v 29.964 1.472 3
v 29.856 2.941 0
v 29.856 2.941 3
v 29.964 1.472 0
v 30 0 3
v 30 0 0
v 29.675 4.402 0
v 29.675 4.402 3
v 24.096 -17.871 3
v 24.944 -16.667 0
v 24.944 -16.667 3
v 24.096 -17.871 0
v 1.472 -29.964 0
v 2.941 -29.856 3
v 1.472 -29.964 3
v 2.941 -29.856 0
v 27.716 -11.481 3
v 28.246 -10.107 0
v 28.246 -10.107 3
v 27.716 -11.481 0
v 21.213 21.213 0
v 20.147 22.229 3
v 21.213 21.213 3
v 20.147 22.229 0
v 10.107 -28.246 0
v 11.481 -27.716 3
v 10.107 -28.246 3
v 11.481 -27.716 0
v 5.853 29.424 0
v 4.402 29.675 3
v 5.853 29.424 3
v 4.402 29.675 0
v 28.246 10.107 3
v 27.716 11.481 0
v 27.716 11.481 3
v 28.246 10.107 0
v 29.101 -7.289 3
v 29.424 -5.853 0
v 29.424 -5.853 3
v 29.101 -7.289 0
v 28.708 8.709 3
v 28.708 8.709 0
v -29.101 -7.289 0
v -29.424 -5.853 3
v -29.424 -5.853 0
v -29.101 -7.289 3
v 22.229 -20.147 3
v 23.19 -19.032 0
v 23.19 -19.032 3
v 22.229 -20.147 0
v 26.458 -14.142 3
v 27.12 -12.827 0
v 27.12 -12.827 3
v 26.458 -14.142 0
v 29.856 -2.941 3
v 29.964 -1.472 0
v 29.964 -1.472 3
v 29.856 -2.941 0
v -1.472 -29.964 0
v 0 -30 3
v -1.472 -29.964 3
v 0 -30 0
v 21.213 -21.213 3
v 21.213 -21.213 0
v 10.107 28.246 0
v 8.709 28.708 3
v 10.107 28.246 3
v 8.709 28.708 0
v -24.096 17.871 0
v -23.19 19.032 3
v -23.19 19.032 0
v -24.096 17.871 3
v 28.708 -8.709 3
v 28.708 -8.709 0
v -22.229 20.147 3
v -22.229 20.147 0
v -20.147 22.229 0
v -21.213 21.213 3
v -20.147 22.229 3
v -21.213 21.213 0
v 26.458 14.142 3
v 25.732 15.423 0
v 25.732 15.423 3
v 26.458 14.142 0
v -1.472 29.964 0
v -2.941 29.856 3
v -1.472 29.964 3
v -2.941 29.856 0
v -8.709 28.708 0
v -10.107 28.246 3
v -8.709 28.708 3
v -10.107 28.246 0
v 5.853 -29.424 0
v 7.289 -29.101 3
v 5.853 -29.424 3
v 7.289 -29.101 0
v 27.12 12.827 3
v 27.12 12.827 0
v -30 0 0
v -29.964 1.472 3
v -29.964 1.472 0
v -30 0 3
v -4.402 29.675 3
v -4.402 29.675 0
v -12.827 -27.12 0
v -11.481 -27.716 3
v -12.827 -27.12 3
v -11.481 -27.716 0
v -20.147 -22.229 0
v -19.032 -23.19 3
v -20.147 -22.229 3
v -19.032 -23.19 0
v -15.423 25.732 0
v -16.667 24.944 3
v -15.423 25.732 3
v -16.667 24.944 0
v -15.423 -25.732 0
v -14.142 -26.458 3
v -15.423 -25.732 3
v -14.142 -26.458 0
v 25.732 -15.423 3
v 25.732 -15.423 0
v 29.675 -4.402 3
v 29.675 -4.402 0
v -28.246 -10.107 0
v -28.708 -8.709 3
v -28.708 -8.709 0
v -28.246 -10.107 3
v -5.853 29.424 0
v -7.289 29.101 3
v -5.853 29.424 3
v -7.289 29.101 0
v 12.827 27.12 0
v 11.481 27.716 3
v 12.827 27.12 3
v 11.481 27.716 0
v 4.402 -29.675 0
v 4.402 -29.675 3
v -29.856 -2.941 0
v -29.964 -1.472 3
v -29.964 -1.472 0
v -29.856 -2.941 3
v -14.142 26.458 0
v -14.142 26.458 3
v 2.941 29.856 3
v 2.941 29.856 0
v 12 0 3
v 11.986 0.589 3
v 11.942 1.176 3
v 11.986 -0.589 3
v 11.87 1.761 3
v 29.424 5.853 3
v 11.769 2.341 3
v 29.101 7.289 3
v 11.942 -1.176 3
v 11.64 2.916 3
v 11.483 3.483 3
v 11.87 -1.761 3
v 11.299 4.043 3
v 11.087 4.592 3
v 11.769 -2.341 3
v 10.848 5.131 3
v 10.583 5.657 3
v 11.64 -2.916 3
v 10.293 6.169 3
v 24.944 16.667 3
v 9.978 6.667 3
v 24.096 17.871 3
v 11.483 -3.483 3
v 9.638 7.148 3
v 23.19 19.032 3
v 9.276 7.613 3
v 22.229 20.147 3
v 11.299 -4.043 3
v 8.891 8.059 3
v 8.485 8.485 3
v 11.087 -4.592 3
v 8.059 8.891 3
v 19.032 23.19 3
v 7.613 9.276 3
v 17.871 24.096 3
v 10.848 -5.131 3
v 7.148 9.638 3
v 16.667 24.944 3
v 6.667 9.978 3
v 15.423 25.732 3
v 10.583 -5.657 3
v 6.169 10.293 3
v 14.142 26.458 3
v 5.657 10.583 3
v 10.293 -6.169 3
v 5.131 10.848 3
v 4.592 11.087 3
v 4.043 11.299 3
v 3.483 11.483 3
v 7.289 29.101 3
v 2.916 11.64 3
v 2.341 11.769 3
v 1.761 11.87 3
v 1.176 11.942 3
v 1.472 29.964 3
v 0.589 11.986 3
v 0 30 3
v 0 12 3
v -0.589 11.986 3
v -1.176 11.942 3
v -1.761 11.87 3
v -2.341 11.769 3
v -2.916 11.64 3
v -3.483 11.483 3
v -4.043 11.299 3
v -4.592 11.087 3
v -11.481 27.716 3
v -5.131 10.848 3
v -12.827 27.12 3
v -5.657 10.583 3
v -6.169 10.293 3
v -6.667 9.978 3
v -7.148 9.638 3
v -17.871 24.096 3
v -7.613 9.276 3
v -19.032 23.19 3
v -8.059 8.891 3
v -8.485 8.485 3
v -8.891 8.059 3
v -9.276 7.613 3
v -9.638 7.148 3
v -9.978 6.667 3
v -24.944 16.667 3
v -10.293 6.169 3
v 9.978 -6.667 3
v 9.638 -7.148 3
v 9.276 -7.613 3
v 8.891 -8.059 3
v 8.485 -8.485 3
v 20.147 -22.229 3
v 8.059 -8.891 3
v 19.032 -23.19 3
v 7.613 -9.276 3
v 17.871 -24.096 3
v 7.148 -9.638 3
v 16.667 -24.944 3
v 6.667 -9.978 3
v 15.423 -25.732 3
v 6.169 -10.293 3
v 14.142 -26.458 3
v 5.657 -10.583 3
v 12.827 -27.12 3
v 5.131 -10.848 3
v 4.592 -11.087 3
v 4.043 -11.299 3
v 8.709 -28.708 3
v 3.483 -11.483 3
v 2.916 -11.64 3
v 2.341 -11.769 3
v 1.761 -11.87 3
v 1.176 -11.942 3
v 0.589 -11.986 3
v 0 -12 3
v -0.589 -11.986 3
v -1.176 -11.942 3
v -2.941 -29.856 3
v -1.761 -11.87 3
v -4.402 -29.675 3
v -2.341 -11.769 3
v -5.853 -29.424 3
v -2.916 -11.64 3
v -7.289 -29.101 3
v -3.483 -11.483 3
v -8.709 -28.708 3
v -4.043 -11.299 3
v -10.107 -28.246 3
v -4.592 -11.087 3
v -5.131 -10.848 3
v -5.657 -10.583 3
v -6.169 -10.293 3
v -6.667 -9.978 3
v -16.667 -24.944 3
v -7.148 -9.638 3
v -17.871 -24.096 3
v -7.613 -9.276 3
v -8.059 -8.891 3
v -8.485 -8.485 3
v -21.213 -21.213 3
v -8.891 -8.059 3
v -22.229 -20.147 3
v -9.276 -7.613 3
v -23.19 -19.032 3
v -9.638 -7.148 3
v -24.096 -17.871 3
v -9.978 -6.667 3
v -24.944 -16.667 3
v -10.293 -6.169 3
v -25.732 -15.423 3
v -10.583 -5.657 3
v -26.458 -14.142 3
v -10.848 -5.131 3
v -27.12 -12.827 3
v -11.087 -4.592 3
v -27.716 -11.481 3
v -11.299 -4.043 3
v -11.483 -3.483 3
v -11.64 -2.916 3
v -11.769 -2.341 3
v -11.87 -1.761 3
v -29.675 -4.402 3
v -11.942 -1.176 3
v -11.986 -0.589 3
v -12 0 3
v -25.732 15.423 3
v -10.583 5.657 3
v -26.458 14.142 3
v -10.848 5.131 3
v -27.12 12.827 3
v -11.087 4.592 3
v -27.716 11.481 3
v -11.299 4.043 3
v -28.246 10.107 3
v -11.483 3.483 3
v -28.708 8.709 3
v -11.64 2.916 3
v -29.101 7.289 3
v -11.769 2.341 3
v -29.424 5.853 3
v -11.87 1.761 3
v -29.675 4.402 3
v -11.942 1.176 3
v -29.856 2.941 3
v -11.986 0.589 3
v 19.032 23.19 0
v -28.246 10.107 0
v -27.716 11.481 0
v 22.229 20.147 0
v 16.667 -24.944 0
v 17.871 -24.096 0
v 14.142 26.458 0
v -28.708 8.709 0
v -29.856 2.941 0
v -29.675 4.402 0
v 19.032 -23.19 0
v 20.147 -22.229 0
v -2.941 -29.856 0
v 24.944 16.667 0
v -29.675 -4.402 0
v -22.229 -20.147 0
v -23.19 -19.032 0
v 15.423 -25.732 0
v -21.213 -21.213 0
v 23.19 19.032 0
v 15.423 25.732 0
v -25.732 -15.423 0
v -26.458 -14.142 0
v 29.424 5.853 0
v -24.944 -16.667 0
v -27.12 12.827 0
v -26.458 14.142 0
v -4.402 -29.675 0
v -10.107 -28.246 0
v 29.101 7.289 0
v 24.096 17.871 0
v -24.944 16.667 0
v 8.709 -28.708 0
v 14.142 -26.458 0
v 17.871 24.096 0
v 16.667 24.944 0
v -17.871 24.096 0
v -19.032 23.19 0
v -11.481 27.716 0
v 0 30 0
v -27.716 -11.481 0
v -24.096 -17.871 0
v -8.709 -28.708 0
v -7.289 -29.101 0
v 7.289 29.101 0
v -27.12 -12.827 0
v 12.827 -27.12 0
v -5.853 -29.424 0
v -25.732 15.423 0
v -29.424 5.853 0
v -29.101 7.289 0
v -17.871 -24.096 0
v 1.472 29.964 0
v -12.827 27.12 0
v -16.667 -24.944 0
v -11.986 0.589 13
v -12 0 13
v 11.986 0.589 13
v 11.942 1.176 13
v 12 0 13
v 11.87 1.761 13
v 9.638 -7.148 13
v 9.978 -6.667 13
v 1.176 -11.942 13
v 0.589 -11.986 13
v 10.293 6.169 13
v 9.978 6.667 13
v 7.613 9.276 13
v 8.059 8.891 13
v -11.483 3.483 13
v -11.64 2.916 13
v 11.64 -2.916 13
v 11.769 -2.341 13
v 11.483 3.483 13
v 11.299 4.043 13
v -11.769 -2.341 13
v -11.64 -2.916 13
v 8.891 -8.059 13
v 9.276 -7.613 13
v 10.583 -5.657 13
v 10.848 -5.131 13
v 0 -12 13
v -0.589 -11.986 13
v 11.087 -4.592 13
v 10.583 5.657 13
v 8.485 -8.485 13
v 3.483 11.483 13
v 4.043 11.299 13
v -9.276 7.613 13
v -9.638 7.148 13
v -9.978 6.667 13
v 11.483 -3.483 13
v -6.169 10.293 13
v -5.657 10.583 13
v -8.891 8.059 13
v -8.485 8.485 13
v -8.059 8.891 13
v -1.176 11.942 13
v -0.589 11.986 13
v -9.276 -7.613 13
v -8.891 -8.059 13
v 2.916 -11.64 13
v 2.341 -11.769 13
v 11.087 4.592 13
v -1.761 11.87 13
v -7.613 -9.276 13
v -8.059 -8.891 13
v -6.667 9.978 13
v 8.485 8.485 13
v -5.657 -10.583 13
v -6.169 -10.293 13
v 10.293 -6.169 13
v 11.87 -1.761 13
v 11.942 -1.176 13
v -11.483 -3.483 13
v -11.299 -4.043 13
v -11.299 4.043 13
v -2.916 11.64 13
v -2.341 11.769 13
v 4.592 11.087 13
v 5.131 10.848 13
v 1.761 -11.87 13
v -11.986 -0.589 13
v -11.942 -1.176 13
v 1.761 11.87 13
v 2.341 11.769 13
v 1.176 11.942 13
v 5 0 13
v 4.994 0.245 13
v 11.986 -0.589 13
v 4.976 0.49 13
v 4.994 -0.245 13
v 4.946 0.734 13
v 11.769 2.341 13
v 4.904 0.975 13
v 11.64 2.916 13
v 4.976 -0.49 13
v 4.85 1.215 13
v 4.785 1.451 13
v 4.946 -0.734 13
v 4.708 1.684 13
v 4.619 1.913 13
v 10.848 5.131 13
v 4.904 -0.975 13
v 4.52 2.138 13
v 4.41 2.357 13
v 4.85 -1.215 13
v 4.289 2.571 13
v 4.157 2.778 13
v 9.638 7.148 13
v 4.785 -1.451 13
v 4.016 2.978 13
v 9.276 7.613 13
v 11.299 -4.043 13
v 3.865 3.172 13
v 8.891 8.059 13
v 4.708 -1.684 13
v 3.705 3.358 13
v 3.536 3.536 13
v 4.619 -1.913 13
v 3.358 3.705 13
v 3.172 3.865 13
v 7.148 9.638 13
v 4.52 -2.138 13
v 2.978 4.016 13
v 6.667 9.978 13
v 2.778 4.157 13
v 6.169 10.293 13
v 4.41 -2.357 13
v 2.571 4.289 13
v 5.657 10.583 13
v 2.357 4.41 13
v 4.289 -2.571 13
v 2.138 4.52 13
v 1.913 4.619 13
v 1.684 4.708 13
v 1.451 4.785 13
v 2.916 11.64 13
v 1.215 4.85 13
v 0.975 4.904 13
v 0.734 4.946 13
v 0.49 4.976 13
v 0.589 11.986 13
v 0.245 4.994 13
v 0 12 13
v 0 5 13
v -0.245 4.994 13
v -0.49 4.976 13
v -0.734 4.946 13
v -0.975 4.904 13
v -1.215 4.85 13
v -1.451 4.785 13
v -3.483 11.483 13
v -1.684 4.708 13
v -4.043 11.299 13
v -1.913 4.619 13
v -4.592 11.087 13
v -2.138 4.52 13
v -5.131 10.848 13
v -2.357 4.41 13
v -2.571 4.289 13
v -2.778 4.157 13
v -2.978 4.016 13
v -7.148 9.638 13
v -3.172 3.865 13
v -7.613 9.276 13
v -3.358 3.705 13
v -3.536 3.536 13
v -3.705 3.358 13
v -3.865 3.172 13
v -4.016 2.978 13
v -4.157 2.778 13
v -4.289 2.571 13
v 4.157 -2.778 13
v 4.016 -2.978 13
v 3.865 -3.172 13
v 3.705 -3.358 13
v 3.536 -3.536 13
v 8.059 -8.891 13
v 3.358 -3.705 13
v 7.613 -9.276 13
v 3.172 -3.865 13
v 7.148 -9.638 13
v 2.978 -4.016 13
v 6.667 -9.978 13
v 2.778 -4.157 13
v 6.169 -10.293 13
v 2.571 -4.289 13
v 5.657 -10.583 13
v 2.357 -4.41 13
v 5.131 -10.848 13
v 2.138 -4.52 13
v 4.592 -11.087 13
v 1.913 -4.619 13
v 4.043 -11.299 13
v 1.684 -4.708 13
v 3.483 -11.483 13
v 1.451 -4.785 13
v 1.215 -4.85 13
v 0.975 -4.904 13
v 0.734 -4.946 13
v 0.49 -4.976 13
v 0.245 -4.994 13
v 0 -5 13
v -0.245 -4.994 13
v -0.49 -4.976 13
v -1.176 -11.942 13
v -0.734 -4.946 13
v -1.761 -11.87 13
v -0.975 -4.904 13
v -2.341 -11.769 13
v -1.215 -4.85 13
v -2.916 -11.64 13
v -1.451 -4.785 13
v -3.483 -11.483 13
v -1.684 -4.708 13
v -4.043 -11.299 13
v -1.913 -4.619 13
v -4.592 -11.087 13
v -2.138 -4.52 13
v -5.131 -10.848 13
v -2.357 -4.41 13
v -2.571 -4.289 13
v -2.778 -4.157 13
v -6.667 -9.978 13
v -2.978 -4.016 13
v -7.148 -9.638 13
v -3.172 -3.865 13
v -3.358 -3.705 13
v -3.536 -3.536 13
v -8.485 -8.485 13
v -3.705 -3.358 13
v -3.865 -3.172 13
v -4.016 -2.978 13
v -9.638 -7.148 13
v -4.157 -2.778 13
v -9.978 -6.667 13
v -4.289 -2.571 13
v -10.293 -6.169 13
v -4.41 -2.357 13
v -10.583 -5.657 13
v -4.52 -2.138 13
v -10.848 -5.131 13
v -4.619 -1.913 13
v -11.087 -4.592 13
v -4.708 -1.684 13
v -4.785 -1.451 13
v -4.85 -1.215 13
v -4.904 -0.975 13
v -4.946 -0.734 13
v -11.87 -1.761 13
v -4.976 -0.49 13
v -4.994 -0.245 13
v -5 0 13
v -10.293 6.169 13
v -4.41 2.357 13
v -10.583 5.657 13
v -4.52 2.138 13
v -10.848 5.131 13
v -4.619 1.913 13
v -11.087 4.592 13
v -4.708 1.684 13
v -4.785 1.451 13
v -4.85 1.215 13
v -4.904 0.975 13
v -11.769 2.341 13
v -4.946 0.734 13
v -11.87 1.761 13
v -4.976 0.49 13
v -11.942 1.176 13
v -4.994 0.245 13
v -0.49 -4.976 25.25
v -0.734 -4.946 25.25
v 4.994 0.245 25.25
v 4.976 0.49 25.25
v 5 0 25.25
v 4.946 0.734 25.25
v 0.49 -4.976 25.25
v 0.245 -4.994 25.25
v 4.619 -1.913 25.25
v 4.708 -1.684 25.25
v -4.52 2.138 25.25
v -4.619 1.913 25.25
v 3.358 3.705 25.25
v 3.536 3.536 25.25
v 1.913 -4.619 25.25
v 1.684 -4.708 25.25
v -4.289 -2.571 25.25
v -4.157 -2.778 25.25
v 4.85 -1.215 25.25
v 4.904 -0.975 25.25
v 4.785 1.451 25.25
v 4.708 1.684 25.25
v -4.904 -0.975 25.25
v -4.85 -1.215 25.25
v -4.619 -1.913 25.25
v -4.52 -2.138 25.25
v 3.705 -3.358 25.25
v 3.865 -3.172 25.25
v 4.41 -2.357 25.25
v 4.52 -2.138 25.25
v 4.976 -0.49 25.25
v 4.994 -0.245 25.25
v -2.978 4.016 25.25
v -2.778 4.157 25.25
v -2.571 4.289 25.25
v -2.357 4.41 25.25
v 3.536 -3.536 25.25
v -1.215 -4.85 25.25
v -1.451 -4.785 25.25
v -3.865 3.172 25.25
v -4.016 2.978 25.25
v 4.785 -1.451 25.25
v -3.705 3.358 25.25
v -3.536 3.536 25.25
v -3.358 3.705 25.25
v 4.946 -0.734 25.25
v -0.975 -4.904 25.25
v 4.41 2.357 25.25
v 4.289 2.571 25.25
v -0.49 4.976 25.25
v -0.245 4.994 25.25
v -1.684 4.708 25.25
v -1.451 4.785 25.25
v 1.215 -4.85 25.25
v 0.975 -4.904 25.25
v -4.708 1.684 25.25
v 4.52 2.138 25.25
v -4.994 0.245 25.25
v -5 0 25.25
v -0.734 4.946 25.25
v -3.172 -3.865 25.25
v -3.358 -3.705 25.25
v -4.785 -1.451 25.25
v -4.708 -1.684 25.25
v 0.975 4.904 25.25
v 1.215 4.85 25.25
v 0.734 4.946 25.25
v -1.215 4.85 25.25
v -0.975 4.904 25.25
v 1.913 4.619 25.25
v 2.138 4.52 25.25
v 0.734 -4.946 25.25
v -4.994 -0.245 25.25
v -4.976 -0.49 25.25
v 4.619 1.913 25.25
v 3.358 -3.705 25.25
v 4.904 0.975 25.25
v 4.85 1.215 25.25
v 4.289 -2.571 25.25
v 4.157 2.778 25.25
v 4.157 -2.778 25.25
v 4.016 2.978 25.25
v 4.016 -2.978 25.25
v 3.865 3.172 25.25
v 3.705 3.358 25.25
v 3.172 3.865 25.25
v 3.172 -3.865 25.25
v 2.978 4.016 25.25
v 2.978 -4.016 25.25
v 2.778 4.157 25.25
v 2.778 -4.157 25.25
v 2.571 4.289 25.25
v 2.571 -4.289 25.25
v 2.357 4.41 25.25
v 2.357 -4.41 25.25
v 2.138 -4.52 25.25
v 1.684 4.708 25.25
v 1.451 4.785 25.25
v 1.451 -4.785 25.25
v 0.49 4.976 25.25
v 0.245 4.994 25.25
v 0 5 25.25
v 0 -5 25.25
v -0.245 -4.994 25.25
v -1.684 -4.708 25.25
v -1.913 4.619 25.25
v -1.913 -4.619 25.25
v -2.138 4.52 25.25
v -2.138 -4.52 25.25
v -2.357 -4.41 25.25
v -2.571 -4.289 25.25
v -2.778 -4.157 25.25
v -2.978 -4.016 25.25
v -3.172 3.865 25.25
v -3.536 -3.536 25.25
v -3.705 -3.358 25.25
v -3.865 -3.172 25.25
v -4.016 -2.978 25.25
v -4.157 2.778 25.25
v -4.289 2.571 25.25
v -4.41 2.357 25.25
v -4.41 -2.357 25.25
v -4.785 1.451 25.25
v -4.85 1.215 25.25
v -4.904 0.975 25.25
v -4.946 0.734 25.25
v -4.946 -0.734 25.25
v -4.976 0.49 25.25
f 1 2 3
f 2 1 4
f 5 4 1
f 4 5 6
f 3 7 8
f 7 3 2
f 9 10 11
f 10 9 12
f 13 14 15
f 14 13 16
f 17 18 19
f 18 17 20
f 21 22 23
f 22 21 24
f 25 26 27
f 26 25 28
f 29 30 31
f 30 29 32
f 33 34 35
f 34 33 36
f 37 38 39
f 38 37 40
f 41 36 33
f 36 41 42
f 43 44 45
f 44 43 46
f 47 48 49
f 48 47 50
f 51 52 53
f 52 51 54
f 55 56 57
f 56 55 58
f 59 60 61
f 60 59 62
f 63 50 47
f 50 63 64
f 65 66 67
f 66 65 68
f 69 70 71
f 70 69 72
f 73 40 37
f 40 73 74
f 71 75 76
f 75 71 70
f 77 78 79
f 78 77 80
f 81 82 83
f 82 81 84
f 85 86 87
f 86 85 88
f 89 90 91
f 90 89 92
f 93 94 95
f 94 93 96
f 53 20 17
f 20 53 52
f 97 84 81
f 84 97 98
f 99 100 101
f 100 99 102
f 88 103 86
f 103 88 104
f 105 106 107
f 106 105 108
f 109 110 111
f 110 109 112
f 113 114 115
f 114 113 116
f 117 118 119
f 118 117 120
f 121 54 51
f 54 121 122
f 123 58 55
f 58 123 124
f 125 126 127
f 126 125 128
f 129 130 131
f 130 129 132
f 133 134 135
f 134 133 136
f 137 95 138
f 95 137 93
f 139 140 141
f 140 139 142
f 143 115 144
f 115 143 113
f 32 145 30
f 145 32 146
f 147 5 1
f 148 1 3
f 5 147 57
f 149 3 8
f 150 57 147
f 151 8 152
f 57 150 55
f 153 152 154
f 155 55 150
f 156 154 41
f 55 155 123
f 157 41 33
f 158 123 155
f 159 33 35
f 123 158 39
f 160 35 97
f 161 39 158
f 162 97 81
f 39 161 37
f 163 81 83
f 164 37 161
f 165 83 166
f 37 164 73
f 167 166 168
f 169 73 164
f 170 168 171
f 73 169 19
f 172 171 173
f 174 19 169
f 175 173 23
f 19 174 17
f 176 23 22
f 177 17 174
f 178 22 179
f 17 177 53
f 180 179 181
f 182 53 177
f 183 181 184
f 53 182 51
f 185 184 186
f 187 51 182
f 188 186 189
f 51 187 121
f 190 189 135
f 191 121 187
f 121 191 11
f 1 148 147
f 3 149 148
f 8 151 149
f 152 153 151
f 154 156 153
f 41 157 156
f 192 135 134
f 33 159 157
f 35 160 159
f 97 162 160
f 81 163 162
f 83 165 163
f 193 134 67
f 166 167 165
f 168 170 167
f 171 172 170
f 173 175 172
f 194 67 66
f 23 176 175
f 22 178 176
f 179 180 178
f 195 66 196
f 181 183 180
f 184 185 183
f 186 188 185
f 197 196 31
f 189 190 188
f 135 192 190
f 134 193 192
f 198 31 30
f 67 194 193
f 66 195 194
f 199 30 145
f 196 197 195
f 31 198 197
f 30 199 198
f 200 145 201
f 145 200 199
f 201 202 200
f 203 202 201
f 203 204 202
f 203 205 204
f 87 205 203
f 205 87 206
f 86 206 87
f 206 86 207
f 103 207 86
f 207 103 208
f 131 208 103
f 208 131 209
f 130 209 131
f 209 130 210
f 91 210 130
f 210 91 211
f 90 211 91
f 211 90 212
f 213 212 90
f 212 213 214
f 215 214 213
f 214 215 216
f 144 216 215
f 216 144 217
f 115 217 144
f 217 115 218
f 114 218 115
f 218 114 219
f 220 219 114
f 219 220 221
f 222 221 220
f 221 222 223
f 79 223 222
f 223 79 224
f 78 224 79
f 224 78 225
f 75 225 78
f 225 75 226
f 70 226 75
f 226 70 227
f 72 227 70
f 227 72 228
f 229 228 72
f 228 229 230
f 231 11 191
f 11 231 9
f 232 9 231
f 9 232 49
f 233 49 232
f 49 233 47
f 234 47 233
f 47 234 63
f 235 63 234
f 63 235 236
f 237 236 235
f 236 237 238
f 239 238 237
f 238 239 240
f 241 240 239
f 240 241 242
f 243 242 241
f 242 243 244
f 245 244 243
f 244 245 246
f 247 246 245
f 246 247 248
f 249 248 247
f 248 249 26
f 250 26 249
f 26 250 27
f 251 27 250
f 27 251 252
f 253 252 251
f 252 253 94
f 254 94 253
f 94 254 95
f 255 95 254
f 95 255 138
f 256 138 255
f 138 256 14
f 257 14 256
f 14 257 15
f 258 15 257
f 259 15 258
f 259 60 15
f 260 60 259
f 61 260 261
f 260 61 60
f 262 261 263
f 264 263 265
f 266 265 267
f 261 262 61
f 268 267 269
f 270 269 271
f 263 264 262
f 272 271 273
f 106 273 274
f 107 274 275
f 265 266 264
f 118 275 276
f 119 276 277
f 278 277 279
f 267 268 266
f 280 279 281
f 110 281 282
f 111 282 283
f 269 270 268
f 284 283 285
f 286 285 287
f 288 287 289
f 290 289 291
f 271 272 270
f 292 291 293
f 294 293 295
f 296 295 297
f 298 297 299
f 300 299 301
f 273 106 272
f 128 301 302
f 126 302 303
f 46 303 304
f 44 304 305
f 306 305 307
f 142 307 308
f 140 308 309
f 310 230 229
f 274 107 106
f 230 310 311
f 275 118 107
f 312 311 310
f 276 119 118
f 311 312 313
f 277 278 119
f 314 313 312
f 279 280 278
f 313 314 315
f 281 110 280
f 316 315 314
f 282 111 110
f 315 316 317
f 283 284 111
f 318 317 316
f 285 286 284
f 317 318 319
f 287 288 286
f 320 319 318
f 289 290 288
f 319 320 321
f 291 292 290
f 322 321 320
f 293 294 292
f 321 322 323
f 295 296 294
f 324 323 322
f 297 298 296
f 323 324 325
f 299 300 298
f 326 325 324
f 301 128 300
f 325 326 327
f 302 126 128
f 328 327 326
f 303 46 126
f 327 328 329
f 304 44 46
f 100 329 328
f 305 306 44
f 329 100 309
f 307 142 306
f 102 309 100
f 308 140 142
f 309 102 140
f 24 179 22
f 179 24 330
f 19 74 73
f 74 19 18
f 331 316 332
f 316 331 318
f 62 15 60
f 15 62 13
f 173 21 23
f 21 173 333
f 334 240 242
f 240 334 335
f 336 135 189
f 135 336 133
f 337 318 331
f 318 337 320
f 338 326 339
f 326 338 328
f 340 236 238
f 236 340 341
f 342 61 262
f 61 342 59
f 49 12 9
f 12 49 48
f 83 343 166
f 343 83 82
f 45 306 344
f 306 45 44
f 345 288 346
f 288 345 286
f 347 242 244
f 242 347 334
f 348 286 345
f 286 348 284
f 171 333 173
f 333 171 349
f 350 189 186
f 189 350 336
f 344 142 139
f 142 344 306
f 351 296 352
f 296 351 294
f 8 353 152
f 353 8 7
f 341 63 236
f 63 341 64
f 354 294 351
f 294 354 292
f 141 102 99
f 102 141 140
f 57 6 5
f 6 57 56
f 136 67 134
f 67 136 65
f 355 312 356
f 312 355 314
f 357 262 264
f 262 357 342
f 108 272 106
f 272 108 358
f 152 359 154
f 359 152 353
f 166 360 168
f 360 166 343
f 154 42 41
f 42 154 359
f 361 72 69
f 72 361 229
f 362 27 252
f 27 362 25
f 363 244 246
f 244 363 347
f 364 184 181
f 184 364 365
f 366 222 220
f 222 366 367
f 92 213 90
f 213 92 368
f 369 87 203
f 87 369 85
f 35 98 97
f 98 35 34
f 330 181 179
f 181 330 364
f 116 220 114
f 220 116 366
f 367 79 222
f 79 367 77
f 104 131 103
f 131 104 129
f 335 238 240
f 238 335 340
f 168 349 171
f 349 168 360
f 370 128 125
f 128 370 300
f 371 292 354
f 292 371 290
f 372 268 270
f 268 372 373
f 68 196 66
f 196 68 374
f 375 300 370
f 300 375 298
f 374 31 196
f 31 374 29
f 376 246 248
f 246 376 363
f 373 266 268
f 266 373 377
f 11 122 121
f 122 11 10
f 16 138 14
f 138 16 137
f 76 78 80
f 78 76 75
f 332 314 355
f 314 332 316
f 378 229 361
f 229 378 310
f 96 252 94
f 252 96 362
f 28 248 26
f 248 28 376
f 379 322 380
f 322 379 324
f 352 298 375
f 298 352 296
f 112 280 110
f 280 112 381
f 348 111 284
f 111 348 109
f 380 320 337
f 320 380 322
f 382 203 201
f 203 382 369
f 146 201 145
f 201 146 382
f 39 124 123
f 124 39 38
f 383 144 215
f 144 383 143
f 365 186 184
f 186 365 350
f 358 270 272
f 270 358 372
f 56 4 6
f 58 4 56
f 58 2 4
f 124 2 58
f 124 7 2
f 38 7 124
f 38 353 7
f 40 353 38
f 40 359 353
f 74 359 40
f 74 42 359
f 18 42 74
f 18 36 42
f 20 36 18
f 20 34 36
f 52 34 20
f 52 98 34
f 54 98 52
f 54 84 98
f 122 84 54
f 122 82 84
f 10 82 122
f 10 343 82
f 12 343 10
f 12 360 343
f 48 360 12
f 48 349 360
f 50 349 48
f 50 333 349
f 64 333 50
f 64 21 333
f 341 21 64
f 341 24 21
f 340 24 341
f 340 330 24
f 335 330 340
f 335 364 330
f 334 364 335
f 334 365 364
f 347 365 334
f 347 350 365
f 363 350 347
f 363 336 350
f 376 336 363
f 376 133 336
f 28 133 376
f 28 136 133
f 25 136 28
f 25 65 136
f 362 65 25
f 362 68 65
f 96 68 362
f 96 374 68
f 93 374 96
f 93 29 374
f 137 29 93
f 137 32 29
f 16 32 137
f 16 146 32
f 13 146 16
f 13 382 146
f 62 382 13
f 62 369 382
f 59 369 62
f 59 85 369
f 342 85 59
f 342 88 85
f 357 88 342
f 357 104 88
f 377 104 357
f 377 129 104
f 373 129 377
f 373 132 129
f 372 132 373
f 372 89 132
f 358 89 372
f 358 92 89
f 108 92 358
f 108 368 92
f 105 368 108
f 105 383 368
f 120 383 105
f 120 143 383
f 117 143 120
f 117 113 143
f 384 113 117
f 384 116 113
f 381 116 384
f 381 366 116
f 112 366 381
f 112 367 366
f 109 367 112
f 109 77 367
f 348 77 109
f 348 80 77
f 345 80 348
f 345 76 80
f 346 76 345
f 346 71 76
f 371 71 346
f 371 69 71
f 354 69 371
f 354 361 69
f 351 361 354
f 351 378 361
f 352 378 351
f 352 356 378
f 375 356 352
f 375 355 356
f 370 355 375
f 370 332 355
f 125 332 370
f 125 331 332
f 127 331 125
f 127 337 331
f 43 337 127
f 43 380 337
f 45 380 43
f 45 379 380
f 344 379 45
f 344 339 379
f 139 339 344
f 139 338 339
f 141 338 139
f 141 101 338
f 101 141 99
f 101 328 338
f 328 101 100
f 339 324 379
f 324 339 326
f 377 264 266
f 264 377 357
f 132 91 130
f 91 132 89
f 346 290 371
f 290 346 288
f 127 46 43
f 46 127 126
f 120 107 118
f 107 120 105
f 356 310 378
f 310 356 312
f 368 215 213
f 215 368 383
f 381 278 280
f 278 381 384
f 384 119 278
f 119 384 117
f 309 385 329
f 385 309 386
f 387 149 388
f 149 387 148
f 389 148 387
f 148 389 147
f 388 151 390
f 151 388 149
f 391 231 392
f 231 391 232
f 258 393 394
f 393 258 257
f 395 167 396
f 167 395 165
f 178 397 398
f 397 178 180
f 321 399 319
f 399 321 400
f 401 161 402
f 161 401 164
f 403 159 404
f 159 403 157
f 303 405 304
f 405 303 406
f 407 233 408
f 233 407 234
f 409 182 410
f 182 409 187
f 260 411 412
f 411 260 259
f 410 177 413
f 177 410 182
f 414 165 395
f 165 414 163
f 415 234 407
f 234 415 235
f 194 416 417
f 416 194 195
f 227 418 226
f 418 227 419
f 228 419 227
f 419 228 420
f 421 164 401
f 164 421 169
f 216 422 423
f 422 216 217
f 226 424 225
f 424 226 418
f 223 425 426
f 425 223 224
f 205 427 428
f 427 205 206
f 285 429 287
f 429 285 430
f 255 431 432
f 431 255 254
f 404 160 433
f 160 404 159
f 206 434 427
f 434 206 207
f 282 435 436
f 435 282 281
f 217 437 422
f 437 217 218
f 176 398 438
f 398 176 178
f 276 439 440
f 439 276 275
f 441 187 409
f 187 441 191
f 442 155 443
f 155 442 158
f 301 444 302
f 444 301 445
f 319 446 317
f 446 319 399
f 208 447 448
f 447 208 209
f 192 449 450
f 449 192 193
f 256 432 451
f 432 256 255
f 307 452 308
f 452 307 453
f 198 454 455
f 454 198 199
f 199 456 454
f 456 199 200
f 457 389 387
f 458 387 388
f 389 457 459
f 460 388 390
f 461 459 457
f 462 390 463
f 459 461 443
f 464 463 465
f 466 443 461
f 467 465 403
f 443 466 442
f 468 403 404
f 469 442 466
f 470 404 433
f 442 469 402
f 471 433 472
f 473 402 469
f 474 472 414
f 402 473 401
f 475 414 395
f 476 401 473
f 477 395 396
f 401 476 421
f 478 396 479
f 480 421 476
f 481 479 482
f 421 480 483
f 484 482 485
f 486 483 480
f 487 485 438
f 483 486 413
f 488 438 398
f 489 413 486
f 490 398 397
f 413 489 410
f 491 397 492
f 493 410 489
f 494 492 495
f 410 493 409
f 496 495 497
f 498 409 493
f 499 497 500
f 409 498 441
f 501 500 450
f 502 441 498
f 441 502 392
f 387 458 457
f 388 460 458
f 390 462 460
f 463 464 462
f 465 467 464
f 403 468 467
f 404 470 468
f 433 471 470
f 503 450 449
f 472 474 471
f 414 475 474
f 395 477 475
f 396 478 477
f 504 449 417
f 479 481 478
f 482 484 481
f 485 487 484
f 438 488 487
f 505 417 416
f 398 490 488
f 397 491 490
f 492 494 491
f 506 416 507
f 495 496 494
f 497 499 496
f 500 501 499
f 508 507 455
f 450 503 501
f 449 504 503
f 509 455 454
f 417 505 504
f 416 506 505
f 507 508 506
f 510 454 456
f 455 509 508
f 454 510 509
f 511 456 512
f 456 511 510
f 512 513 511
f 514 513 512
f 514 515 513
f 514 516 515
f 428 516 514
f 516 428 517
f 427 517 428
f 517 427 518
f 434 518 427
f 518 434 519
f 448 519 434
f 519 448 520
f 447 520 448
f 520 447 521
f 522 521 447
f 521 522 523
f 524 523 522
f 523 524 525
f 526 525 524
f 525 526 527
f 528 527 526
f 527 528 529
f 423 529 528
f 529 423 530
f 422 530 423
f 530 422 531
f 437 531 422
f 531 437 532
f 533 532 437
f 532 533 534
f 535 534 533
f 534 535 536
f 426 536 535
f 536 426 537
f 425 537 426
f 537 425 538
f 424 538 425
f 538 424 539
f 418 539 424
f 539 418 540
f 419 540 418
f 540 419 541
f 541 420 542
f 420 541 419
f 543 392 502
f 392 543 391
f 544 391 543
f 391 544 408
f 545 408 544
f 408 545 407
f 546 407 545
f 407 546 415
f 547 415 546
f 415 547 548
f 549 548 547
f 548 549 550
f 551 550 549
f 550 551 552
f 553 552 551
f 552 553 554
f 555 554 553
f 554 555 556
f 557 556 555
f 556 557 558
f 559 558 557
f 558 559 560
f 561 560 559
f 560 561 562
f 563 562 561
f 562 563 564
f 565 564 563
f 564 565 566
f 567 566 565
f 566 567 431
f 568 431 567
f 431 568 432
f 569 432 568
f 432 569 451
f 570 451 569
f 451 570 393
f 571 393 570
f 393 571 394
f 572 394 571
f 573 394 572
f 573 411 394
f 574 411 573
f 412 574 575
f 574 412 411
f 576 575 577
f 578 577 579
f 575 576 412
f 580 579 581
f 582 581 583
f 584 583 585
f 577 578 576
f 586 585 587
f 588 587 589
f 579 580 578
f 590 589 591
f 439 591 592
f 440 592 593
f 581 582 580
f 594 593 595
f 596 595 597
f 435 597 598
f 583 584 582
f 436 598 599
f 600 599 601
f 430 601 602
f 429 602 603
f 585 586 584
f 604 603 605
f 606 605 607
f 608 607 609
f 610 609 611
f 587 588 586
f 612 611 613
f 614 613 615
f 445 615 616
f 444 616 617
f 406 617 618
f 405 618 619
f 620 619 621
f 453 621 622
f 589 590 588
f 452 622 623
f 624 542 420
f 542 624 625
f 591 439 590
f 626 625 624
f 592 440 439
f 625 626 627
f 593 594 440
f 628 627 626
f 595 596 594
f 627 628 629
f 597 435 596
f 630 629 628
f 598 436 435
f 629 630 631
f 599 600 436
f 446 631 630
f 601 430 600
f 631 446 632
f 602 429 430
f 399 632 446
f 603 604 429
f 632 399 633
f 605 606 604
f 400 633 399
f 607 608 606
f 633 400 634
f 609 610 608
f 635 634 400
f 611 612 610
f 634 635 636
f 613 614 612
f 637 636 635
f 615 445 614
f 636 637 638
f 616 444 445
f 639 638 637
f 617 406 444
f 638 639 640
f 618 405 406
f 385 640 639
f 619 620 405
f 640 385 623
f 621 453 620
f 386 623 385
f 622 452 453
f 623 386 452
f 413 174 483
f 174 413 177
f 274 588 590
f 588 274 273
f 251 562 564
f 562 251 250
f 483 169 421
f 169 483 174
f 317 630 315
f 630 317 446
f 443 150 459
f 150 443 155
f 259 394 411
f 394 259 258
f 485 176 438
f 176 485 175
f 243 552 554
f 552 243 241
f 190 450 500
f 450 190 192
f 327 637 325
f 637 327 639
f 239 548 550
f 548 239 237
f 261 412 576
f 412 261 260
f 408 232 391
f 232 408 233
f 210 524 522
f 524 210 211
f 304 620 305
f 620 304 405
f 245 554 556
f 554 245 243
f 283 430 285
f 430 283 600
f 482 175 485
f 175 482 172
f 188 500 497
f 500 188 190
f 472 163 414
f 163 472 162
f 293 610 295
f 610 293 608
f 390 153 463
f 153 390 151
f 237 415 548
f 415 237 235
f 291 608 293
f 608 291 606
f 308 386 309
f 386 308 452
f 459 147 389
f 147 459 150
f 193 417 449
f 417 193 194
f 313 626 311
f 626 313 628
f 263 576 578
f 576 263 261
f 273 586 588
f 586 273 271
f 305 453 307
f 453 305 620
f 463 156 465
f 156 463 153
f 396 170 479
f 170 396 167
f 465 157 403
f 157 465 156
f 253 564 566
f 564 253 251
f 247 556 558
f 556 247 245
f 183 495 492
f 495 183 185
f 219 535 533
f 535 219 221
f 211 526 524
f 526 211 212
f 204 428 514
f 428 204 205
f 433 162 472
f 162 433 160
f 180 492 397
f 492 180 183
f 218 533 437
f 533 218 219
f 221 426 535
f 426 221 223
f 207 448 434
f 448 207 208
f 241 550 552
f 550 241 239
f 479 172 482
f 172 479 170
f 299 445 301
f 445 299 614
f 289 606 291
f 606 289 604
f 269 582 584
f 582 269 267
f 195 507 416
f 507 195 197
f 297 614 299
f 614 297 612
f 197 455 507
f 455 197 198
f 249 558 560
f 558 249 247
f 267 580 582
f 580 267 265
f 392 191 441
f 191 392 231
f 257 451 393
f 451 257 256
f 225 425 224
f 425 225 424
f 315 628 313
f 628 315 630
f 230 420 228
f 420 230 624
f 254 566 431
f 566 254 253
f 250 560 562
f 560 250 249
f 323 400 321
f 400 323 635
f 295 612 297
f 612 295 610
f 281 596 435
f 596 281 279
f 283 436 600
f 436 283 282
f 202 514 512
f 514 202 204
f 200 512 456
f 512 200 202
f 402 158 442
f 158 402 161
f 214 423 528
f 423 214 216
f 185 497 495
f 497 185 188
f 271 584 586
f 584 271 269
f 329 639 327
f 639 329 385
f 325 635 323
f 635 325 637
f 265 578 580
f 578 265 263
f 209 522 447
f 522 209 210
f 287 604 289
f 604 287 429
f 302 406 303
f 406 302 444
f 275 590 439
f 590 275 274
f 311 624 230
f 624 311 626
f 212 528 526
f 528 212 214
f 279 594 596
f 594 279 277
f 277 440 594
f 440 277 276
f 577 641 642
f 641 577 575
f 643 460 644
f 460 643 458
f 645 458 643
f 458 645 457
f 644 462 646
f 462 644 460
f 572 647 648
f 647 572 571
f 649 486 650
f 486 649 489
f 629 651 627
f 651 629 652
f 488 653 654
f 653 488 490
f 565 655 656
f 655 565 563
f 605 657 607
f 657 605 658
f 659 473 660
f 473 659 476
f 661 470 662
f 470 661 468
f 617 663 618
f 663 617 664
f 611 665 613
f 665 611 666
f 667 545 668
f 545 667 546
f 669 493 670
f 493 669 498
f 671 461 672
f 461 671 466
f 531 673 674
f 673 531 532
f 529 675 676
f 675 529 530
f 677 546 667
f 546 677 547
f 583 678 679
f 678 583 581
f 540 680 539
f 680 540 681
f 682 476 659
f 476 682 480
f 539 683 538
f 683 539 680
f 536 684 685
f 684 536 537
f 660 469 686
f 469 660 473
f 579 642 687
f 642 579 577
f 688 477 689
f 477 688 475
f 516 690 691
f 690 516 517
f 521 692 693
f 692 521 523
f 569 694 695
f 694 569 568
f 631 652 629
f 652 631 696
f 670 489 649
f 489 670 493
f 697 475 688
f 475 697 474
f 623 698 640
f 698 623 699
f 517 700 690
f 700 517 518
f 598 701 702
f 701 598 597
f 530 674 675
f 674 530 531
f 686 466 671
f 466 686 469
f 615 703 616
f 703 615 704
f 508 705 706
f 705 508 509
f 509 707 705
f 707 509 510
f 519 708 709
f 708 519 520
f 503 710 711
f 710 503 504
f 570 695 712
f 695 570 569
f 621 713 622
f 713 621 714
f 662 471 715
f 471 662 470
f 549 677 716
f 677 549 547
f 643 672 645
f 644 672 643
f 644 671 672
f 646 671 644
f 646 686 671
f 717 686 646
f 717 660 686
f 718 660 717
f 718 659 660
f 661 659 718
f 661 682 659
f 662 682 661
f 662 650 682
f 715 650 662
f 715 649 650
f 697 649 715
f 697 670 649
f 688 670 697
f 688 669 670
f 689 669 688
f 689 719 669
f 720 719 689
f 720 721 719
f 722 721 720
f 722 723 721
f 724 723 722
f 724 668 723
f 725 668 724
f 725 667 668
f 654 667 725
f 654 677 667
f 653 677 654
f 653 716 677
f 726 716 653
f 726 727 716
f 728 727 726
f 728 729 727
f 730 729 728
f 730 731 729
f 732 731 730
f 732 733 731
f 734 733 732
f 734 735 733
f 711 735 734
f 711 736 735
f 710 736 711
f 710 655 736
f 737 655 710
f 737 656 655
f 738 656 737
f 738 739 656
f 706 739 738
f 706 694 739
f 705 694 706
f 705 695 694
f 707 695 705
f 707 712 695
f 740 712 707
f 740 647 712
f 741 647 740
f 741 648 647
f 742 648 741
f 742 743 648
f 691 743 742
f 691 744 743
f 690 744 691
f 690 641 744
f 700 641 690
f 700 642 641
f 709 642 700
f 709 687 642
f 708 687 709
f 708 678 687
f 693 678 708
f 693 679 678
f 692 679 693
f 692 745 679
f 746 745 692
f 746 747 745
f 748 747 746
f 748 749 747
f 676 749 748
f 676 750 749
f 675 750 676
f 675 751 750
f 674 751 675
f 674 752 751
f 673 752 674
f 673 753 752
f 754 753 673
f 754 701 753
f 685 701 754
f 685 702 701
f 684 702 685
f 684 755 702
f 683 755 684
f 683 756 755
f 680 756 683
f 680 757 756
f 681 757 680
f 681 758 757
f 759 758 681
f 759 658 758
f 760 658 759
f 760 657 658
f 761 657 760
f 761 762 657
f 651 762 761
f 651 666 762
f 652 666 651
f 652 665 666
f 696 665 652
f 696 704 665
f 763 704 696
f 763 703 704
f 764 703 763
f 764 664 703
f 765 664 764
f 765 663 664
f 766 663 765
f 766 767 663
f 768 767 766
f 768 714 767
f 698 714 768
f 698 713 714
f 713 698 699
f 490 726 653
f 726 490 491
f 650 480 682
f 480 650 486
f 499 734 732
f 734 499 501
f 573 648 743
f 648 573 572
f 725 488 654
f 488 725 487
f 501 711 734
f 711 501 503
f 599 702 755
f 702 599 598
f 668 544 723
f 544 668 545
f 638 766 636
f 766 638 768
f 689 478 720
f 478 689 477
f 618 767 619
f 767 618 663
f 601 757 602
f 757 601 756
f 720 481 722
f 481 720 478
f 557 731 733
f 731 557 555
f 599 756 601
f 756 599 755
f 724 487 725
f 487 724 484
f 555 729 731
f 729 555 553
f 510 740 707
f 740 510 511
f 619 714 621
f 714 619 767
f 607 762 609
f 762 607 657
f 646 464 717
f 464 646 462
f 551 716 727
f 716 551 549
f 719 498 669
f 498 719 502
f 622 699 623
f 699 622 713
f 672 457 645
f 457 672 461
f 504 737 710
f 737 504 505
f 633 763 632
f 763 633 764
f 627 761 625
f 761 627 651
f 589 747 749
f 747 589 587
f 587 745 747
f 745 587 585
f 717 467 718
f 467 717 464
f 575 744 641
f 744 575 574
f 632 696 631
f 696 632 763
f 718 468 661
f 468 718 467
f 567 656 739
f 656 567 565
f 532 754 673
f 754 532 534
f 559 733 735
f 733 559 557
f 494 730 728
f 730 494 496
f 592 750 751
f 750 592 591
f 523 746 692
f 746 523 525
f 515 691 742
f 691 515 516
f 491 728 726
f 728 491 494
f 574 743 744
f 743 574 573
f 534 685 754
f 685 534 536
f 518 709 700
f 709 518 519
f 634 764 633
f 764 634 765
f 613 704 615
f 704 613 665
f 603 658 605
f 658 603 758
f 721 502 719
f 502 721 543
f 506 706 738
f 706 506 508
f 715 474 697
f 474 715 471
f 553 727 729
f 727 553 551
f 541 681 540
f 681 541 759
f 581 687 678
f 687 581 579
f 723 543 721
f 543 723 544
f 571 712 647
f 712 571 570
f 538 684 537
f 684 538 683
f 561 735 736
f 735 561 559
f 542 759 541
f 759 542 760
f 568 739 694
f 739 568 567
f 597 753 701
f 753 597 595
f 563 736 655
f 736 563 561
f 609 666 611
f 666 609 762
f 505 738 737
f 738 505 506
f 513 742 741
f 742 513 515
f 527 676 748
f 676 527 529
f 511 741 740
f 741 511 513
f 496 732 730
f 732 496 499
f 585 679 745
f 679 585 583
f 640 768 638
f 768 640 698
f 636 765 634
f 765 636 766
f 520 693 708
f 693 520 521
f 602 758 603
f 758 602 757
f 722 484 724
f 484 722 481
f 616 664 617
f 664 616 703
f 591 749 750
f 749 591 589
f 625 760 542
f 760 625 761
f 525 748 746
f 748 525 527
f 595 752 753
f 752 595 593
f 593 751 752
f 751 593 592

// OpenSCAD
$fn=128; //Increased resolution for the shaft, which needs high res to acheive a good print
         //that will mate with the bearing.

union(){
    cylinder(3, 30, 30);
    translate([0,0,3]) cylinder(10, 12, 12);
    translate([0,0,13]) cylinder(4 + 8.25, 5, 5);
}
